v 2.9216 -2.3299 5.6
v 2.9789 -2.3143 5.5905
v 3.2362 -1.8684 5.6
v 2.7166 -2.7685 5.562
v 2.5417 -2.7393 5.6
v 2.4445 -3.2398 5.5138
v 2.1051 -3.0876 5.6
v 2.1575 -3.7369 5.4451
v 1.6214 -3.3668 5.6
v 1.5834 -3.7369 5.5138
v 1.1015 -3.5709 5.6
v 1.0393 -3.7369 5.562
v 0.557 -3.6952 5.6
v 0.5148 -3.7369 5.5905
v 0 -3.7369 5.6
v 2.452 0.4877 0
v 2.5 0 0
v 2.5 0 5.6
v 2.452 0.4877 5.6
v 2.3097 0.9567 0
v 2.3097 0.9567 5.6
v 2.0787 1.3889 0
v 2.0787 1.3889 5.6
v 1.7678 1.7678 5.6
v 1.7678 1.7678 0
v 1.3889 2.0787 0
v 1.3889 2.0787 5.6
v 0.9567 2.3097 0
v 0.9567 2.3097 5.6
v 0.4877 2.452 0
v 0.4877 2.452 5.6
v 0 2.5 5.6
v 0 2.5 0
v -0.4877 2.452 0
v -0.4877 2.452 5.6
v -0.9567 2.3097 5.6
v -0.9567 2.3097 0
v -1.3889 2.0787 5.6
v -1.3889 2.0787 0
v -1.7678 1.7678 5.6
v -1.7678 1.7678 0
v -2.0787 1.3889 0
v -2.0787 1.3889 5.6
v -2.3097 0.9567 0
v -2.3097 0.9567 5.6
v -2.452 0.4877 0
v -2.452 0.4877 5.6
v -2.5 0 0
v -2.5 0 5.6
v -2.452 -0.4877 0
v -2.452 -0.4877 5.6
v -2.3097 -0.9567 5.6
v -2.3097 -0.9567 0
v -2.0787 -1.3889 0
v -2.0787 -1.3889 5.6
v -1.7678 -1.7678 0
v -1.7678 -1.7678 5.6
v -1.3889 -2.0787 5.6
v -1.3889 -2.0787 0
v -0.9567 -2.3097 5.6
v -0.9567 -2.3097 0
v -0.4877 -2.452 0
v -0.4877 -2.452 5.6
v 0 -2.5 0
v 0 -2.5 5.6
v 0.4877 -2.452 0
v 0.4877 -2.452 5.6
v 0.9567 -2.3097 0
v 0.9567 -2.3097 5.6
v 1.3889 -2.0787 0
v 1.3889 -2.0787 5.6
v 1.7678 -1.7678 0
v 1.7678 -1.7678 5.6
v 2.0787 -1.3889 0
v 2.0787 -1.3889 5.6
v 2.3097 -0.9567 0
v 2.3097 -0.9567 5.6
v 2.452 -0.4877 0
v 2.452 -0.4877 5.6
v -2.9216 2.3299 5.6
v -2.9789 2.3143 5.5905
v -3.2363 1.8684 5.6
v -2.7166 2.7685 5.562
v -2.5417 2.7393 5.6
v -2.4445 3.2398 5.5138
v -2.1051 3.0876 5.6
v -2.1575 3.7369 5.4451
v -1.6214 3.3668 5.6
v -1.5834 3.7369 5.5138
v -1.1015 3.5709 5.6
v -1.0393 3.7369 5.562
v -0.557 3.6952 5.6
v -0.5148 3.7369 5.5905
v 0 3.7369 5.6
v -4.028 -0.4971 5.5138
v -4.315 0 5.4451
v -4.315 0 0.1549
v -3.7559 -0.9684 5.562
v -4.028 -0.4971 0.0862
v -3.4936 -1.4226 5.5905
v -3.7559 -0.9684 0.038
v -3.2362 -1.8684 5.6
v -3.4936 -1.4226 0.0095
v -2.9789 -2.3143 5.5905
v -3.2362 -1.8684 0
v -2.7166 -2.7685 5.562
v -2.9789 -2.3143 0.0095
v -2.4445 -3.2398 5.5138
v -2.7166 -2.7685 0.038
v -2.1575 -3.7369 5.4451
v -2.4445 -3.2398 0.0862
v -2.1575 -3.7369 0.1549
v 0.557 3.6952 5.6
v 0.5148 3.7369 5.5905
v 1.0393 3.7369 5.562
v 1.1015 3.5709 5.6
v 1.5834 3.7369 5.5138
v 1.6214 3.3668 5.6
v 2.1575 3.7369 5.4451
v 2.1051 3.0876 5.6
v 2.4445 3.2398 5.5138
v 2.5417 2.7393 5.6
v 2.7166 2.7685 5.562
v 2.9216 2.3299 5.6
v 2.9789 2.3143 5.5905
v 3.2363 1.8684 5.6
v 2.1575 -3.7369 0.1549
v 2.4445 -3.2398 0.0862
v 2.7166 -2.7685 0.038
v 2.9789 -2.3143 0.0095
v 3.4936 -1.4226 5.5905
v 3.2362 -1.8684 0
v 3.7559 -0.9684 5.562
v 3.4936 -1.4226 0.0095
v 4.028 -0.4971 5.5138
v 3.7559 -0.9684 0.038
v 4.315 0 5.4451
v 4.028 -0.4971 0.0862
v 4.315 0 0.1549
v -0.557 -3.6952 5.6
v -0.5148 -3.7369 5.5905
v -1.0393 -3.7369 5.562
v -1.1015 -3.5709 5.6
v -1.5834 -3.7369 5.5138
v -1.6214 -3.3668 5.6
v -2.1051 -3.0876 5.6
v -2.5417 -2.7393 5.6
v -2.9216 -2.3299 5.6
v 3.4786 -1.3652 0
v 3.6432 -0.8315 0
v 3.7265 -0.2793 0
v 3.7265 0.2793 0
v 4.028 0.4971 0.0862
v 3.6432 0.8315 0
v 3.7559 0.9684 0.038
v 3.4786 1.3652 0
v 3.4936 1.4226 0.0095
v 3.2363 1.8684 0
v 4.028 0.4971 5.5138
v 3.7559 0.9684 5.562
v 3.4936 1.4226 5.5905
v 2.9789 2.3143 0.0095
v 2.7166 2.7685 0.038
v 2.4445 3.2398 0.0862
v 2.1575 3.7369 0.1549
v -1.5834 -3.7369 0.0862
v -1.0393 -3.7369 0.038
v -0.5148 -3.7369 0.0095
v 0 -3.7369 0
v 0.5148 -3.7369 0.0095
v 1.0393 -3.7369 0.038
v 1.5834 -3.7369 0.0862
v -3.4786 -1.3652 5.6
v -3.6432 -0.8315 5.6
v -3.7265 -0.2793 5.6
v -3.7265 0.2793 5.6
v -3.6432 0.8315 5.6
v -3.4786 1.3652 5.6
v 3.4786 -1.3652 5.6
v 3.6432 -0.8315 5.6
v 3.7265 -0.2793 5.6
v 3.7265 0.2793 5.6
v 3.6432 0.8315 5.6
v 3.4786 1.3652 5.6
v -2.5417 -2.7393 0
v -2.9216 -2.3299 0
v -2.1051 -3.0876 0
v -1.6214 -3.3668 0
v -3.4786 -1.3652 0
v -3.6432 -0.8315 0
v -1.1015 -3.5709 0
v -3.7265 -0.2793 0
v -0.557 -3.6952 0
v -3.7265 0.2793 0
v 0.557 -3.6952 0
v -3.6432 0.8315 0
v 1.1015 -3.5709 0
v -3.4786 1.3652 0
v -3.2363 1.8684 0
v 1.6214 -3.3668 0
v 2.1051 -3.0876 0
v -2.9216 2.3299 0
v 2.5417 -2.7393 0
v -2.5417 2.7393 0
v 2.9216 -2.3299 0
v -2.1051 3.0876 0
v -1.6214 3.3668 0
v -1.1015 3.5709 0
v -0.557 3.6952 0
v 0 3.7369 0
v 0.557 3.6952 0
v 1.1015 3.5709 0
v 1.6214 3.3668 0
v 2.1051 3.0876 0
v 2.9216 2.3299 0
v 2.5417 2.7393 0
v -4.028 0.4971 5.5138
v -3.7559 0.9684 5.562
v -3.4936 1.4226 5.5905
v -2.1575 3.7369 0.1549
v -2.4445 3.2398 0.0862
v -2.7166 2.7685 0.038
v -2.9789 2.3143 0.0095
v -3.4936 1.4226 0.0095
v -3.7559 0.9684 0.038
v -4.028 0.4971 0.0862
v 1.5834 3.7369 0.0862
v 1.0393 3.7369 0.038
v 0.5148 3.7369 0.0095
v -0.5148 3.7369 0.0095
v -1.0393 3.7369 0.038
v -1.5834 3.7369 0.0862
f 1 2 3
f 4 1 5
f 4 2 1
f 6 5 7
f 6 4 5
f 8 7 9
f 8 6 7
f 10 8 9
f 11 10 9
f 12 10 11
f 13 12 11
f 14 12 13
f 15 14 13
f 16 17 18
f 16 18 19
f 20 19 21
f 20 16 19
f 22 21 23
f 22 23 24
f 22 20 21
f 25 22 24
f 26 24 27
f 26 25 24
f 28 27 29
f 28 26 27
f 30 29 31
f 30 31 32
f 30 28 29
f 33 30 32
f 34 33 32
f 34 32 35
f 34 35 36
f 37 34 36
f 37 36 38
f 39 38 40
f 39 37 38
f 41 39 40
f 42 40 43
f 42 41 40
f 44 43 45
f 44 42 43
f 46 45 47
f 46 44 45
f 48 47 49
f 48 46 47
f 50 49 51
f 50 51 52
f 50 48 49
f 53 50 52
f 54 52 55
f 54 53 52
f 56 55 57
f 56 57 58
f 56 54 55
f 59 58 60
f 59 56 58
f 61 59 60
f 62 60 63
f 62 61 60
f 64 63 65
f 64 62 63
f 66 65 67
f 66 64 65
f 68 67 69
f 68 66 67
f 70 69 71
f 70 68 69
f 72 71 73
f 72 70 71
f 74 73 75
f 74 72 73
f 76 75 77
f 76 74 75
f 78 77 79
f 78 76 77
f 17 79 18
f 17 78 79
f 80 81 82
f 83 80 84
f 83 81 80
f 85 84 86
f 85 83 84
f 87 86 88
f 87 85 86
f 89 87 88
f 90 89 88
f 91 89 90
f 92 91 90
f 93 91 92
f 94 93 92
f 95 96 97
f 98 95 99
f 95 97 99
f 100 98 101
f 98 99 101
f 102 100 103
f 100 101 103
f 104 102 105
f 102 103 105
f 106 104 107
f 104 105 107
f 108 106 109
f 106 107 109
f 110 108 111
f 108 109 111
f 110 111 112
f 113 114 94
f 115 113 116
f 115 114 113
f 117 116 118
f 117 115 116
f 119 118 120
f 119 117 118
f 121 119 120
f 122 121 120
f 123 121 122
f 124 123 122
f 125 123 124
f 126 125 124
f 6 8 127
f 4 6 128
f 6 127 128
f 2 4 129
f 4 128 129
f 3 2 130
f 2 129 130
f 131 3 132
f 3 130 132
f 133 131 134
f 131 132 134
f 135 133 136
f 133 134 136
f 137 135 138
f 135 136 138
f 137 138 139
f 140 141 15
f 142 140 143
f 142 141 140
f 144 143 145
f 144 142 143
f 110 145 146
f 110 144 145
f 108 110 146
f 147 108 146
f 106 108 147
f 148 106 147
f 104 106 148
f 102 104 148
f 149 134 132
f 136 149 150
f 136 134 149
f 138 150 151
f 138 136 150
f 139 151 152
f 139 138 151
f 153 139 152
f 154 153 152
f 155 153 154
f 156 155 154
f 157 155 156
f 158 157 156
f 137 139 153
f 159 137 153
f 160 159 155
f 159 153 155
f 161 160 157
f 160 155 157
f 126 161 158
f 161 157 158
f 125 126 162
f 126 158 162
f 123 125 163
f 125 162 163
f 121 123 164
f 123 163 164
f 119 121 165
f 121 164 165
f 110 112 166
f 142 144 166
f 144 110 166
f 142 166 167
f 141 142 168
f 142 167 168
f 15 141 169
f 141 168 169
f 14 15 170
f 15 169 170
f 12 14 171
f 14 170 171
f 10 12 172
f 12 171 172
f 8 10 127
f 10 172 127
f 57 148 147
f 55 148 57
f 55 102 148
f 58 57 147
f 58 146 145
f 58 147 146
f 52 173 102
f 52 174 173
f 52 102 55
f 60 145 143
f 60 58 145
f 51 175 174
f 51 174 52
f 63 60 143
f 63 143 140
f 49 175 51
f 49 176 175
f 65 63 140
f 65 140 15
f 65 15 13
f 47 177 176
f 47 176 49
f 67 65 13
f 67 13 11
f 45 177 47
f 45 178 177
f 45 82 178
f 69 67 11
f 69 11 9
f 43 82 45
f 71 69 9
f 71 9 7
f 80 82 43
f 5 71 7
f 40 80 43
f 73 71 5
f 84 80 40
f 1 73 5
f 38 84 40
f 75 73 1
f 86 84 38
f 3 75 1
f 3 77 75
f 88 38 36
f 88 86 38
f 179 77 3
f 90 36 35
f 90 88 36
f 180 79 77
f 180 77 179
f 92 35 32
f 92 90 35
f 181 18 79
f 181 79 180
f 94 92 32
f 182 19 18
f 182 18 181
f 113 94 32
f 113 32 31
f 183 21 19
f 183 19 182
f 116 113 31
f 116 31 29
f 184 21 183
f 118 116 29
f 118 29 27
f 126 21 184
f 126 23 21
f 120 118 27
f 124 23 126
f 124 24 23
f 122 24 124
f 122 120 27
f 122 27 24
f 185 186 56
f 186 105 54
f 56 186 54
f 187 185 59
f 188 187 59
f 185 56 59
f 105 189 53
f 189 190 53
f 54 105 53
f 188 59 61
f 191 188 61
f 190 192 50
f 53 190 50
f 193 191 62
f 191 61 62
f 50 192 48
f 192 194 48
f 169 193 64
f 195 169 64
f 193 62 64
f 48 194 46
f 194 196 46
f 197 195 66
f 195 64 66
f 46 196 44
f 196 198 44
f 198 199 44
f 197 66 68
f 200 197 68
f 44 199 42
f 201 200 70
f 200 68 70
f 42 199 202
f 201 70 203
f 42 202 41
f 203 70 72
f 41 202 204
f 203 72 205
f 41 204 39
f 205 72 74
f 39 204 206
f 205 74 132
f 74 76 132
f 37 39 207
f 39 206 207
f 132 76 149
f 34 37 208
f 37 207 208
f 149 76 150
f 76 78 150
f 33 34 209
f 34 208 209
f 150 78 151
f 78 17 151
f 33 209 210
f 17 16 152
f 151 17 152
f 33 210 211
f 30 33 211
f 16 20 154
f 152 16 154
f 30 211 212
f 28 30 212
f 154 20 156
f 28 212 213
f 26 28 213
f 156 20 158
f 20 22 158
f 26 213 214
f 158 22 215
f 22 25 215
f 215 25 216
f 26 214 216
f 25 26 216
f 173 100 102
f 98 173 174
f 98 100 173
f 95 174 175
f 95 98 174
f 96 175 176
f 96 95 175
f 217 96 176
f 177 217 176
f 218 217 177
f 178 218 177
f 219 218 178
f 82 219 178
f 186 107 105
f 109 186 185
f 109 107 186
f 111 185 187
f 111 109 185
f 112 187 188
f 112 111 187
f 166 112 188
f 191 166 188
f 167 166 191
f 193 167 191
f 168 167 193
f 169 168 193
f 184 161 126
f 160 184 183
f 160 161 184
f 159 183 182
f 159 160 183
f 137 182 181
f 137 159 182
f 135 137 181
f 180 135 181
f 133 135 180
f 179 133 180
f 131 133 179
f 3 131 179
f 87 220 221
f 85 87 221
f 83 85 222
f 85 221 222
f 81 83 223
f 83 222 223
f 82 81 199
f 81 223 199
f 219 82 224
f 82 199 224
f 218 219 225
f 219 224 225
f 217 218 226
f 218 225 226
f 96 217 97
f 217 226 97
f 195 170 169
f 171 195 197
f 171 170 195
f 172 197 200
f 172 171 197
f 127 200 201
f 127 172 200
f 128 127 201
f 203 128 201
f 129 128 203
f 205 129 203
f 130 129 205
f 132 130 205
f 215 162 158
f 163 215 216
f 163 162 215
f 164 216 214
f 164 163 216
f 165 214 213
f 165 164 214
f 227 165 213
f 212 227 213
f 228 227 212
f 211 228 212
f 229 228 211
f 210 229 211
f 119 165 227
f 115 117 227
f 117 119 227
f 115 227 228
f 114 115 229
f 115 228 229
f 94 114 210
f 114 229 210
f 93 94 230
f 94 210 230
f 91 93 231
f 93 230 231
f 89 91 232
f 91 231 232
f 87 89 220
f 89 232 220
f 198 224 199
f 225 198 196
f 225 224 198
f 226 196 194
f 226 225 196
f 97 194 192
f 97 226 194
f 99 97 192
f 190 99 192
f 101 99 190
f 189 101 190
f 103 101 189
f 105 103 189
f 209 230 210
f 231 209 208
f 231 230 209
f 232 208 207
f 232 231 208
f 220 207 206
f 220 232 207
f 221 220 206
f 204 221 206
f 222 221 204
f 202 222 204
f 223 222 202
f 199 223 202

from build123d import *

# Parameters (mm, degrees)
SKETCH_1_R          = 2.5
EXTRUDE_587_DEPTH   = 5.6
SKETCH_2_OUTSIDE_W  = 296.81
SKETCH_2_OUTSIDE_H  = 295.654
SKETCH_2_OUTSIDE_R  = 3.736899617
CUT_EXTRUDE_1_DEPTH = 38
CUT_EXTRUDE_1_TAPER = 75
SKETCH_3_OUTSIDE_W  = 296.81
SKETCH_3_OUTSIDE_H  = 295.654
SKETCH_3_OUTSIDE_R  = 3.736899617
CUT_EXTRUDE_2_DEPTH = 38
CUT_EXTRUDE_2_TAPER = 75


with BuildPart() as part:
    # 草图1 → Extrude 587 (new body)
    with BuildSketch(Plane.XY):
        Polygon((2.1575, 3.736899617), (-2.1575, 3.736899617), (-4.315, 0), (-2.1575, -3.736899617), (2.1575, -3.736899617), (4.315, 0), align=None)
        Circle(SKETCH_1_R, mode=Mode.SUBTRACT)
    extrude(amount=EXTRUDE_587_DEPTH)

    # 草图2 outside → 切除-拉伸1 (cut)
    with BuildSketch(Plane(origin=(0, 0, 0), x_dir=(-1, 0, 0), z_dir=(0, 0, -1))):
        Rectangle(SKETCH_2_OUTSIDE_W, SKETCH_2_OUTSIDE_H)
        Circle(SKETCH_2_OUTSIDE_R, mode=Mode.SUBTRACT)
    extrude(amount=-CUT_EXTRUDE_1_DEPTH, taper=CUT_EXTRUDE_1_TAPER, mode=Mode.SUBTRACT)

    # 草图3 outside → 切除-拉伸2 (cut)
    with BuildSketch(Plane.XY.offset(5.6)):
        Rectangle(SKETCH_3_OUTSIDE_W, SKETCH_3_OUTSIDE_H)
        Circle(SKETCH_3_OUTSIDE_R, mode=Mode.SUBTRACT)
    extrude(amount=-CUT_EXTRUDE_2_DEPTH, taper=CUT_EXTRUDE_2_TAPER, mode=Mode.SUBTRACT)


solid = part.part
